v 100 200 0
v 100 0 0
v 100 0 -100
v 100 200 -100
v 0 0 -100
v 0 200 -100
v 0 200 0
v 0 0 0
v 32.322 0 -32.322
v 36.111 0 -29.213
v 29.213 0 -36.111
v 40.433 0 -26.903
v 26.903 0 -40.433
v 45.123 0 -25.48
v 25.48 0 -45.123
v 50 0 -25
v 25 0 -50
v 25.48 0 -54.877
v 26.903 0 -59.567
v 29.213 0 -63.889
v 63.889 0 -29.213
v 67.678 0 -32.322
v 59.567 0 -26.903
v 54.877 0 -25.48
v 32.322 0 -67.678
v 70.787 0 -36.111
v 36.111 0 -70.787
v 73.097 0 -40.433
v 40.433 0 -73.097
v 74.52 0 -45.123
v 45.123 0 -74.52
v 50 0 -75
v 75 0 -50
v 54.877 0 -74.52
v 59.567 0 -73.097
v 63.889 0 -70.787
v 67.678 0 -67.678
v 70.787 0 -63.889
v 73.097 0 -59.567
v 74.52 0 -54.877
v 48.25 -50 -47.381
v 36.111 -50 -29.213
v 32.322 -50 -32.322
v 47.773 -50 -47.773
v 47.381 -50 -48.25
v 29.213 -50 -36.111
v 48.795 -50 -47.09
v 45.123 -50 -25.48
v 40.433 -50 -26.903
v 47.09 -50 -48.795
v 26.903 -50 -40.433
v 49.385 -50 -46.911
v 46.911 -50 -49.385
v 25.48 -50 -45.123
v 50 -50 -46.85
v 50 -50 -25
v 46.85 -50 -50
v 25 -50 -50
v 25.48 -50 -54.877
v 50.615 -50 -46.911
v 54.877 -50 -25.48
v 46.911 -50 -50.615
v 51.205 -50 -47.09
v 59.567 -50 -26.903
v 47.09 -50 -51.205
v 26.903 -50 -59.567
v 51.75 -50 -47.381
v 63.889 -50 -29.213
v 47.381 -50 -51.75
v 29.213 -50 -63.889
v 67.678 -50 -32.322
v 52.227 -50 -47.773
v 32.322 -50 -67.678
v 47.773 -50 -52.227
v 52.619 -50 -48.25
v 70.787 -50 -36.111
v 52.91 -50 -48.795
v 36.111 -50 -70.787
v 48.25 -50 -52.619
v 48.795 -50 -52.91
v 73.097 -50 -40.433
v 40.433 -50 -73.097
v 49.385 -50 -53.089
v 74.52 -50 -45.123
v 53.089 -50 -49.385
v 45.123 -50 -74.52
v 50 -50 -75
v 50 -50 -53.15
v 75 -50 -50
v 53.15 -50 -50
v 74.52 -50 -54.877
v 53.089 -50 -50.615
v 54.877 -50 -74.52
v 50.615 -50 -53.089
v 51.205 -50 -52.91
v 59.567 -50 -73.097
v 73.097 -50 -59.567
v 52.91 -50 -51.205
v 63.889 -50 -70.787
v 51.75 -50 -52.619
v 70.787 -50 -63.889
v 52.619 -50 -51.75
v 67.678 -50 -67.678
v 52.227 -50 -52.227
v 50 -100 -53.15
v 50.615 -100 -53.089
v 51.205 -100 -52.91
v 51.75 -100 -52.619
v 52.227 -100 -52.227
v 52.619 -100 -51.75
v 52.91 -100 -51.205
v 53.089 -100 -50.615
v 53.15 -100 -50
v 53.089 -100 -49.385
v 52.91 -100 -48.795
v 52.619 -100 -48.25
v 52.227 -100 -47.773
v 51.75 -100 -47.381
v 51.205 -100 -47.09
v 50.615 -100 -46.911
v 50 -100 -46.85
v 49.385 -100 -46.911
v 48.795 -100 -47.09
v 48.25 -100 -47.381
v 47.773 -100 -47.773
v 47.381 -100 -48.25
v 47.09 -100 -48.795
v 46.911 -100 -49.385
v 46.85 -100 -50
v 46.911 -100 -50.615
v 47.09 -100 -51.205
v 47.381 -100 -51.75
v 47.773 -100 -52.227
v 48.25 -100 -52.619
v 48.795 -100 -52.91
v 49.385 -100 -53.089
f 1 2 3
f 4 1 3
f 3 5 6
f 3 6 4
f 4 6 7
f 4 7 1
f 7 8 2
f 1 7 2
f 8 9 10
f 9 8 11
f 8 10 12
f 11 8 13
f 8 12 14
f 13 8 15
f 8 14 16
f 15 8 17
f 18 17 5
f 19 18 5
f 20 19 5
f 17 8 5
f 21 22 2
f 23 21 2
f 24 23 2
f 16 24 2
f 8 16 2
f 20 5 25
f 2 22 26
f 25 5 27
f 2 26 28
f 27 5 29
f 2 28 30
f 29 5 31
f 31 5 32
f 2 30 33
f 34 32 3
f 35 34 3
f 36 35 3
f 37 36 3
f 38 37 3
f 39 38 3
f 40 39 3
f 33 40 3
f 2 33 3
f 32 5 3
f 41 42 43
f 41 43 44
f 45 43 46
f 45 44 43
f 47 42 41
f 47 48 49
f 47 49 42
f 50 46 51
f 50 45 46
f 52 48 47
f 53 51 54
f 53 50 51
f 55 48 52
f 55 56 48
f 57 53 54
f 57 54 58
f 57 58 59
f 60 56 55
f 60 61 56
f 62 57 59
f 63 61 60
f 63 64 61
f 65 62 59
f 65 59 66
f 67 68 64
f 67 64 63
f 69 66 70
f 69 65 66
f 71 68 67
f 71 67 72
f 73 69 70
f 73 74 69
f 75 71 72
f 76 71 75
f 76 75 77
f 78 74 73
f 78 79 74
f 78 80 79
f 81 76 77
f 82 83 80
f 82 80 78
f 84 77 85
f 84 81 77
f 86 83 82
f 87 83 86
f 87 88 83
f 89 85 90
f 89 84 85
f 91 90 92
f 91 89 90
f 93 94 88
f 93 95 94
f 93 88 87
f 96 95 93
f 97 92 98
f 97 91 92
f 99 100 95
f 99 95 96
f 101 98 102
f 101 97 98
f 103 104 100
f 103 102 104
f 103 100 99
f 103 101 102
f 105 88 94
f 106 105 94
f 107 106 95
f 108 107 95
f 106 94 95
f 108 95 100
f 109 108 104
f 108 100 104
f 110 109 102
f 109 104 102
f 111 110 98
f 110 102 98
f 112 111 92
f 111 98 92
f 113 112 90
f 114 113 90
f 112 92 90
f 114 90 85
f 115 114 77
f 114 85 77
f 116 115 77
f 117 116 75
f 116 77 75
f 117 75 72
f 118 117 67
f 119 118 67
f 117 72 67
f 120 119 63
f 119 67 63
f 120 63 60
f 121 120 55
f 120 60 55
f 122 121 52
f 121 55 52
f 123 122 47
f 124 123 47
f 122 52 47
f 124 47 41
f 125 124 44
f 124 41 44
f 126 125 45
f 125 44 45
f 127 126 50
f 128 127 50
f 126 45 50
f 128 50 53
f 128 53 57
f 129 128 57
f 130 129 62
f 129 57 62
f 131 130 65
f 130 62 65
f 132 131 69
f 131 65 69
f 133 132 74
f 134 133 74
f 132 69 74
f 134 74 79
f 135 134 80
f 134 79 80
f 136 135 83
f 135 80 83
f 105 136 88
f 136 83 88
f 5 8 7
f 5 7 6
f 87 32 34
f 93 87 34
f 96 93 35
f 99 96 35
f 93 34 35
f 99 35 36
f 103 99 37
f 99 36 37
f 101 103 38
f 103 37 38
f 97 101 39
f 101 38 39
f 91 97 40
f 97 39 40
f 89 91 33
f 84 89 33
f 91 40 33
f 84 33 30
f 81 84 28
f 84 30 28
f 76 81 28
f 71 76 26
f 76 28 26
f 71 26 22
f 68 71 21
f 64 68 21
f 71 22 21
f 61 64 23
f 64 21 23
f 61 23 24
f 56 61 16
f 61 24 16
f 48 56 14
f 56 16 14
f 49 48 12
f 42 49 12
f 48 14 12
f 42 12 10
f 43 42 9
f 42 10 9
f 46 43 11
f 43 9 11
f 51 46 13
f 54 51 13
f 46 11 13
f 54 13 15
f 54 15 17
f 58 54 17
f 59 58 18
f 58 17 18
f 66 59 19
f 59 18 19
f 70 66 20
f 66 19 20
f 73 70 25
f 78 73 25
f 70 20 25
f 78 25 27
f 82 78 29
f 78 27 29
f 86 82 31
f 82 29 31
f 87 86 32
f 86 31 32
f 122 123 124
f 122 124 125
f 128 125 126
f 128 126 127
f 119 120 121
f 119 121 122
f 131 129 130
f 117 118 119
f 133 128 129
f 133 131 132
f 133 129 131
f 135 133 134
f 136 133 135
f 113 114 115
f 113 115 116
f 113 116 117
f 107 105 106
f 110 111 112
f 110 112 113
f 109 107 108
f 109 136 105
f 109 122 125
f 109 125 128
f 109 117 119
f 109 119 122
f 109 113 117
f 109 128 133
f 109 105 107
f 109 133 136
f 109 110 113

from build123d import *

# Parameters (mm, degrees)
SKETCH1_W           = 100
SKETCH1_H           = 100
BOSS_EXTRUDE1_DEPTH = 200
SKETCH2_R           = 25
BOSS_EXTRUDE2_DEPTH = 50
SKETCH3_R           = 3.15
BOSS_EXTRUDE3_DEPTH = 50


with BuildPart() as part:
    # Sketch1 → Boss-Extrude1 (new body)
    with BuildSketch(Plane(origin=(0, 0, 0), x_dir=(1, 0, 0), z_dir=(0, 1, 0))):
        with Locations((50, 50)):
            Rectangle(SKETCH1_W, SKETCH1_H)
    extrude(amount=BOSS_EXTRUDE1_DEPTH)

    # Sketch2 → Boss-Extrude2 (add)
    with BuildSketch(Plane.XZ):
        with Locations(Location((50, -50, 0), (0, 0, 270))):
            Circle(SKETCH2_R)
    extrude(amount=BOSS_EXTRUDE2_DEPTH)

    # Sketch3 → Boss-Extrude3 (add)
    with BuildSketch(Plane.XZ.offset(50)):
        with Locations(Location((50, -50, 0), (0, 0, 270))):
            Circle(SKETCH3_R)
    extrude(amount=BOSS_EXTRUDE3_DEPTH)


solid = part.part
